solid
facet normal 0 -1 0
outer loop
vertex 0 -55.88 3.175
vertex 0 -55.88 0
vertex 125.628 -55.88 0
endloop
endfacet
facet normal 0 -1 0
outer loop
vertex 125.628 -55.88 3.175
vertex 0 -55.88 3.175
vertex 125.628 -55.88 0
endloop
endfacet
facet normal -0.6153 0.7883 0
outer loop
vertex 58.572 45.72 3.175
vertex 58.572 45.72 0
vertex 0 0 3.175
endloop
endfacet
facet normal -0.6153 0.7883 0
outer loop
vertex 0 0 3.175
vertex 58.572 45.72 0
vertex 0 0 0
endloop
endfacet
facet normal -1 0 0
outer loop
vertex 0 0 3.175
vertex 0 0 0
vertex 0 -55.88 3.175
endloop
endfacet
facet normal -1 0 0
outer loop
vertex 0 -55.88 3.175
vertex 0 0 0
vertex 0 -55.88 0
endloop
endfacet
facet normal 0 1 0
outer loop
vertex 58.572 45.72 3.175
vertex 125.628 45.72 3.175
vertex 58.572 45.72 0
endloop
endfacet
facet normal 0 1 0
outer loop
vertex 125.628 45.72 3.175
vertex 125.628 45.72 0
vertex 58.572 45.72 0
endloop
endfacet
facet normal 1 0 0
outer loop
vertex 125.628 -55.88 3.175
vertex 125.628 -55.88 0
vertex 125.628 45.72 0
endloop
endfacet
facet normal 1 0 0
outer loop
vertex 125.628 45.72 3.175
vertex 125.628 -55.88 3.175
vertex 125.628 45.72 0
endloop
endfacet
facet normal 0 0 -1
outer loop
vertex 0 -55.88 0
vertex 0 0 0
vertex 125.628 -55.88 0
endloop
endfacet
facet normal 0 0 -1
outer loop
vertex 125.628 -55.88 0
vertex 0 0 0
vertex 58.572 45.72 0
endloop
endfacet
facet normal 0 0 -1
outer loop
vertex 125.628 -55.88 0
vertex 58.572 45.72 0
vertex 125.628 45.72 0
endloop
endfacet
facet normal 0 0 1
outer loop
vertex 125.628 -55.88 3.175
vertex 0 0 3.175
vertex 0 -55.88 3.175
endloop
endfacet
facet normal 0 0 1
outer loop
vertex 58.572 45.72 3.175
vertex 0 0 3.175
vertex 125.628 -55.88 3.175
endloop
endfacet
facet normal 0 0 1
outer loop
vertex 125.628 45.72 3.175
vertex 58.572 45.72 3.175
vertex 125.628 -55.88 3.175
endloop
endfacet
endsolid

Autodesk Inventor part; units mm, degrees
ref_plane "YZ Plane" through (0, 0, 0) normal (1, 0, 0) x (0, 1, 0)
ref_plane "XZ Plane" through (0, 0, 0) normal (0, 1, 0) x (-1, 0, 0)
ref_plane "XY Plane" through (0, 0, 0) normal (0, 0, 1) x (1, 0, 0)
sketch "Sketch2" plane through (0, 0, 0) normal (0, 0, 1) x (1, 0, 0)
  line L0 (0, 0) -> (0, -55.88)
  line L1 (0, 0) -> (55.88, 0) construction
  line L2 (0, -55.88) -> (125.6284, -55.88)
  line L3 (125.6284, -55.88) -> (125.6284, 45.72)
  line L4 (125.6284, 45.72) -> (58.5724, 45.72)
  line L5 (58.5724, 45.72) -> (0, 0)
  dimension "d4" = 55.88
  dimension "d5" = 90
  dimension "d6" = 125.6284
  dimension "d7" = 101.6
  dimension "d8" = 90
  dimension "d9" = 67.056
  dimension "d10" = 90
extrude "Extrusion2" add sketch "Sketch2" along normal blind 3.175
properties part number "side plate" material "Aluminum 6061"
